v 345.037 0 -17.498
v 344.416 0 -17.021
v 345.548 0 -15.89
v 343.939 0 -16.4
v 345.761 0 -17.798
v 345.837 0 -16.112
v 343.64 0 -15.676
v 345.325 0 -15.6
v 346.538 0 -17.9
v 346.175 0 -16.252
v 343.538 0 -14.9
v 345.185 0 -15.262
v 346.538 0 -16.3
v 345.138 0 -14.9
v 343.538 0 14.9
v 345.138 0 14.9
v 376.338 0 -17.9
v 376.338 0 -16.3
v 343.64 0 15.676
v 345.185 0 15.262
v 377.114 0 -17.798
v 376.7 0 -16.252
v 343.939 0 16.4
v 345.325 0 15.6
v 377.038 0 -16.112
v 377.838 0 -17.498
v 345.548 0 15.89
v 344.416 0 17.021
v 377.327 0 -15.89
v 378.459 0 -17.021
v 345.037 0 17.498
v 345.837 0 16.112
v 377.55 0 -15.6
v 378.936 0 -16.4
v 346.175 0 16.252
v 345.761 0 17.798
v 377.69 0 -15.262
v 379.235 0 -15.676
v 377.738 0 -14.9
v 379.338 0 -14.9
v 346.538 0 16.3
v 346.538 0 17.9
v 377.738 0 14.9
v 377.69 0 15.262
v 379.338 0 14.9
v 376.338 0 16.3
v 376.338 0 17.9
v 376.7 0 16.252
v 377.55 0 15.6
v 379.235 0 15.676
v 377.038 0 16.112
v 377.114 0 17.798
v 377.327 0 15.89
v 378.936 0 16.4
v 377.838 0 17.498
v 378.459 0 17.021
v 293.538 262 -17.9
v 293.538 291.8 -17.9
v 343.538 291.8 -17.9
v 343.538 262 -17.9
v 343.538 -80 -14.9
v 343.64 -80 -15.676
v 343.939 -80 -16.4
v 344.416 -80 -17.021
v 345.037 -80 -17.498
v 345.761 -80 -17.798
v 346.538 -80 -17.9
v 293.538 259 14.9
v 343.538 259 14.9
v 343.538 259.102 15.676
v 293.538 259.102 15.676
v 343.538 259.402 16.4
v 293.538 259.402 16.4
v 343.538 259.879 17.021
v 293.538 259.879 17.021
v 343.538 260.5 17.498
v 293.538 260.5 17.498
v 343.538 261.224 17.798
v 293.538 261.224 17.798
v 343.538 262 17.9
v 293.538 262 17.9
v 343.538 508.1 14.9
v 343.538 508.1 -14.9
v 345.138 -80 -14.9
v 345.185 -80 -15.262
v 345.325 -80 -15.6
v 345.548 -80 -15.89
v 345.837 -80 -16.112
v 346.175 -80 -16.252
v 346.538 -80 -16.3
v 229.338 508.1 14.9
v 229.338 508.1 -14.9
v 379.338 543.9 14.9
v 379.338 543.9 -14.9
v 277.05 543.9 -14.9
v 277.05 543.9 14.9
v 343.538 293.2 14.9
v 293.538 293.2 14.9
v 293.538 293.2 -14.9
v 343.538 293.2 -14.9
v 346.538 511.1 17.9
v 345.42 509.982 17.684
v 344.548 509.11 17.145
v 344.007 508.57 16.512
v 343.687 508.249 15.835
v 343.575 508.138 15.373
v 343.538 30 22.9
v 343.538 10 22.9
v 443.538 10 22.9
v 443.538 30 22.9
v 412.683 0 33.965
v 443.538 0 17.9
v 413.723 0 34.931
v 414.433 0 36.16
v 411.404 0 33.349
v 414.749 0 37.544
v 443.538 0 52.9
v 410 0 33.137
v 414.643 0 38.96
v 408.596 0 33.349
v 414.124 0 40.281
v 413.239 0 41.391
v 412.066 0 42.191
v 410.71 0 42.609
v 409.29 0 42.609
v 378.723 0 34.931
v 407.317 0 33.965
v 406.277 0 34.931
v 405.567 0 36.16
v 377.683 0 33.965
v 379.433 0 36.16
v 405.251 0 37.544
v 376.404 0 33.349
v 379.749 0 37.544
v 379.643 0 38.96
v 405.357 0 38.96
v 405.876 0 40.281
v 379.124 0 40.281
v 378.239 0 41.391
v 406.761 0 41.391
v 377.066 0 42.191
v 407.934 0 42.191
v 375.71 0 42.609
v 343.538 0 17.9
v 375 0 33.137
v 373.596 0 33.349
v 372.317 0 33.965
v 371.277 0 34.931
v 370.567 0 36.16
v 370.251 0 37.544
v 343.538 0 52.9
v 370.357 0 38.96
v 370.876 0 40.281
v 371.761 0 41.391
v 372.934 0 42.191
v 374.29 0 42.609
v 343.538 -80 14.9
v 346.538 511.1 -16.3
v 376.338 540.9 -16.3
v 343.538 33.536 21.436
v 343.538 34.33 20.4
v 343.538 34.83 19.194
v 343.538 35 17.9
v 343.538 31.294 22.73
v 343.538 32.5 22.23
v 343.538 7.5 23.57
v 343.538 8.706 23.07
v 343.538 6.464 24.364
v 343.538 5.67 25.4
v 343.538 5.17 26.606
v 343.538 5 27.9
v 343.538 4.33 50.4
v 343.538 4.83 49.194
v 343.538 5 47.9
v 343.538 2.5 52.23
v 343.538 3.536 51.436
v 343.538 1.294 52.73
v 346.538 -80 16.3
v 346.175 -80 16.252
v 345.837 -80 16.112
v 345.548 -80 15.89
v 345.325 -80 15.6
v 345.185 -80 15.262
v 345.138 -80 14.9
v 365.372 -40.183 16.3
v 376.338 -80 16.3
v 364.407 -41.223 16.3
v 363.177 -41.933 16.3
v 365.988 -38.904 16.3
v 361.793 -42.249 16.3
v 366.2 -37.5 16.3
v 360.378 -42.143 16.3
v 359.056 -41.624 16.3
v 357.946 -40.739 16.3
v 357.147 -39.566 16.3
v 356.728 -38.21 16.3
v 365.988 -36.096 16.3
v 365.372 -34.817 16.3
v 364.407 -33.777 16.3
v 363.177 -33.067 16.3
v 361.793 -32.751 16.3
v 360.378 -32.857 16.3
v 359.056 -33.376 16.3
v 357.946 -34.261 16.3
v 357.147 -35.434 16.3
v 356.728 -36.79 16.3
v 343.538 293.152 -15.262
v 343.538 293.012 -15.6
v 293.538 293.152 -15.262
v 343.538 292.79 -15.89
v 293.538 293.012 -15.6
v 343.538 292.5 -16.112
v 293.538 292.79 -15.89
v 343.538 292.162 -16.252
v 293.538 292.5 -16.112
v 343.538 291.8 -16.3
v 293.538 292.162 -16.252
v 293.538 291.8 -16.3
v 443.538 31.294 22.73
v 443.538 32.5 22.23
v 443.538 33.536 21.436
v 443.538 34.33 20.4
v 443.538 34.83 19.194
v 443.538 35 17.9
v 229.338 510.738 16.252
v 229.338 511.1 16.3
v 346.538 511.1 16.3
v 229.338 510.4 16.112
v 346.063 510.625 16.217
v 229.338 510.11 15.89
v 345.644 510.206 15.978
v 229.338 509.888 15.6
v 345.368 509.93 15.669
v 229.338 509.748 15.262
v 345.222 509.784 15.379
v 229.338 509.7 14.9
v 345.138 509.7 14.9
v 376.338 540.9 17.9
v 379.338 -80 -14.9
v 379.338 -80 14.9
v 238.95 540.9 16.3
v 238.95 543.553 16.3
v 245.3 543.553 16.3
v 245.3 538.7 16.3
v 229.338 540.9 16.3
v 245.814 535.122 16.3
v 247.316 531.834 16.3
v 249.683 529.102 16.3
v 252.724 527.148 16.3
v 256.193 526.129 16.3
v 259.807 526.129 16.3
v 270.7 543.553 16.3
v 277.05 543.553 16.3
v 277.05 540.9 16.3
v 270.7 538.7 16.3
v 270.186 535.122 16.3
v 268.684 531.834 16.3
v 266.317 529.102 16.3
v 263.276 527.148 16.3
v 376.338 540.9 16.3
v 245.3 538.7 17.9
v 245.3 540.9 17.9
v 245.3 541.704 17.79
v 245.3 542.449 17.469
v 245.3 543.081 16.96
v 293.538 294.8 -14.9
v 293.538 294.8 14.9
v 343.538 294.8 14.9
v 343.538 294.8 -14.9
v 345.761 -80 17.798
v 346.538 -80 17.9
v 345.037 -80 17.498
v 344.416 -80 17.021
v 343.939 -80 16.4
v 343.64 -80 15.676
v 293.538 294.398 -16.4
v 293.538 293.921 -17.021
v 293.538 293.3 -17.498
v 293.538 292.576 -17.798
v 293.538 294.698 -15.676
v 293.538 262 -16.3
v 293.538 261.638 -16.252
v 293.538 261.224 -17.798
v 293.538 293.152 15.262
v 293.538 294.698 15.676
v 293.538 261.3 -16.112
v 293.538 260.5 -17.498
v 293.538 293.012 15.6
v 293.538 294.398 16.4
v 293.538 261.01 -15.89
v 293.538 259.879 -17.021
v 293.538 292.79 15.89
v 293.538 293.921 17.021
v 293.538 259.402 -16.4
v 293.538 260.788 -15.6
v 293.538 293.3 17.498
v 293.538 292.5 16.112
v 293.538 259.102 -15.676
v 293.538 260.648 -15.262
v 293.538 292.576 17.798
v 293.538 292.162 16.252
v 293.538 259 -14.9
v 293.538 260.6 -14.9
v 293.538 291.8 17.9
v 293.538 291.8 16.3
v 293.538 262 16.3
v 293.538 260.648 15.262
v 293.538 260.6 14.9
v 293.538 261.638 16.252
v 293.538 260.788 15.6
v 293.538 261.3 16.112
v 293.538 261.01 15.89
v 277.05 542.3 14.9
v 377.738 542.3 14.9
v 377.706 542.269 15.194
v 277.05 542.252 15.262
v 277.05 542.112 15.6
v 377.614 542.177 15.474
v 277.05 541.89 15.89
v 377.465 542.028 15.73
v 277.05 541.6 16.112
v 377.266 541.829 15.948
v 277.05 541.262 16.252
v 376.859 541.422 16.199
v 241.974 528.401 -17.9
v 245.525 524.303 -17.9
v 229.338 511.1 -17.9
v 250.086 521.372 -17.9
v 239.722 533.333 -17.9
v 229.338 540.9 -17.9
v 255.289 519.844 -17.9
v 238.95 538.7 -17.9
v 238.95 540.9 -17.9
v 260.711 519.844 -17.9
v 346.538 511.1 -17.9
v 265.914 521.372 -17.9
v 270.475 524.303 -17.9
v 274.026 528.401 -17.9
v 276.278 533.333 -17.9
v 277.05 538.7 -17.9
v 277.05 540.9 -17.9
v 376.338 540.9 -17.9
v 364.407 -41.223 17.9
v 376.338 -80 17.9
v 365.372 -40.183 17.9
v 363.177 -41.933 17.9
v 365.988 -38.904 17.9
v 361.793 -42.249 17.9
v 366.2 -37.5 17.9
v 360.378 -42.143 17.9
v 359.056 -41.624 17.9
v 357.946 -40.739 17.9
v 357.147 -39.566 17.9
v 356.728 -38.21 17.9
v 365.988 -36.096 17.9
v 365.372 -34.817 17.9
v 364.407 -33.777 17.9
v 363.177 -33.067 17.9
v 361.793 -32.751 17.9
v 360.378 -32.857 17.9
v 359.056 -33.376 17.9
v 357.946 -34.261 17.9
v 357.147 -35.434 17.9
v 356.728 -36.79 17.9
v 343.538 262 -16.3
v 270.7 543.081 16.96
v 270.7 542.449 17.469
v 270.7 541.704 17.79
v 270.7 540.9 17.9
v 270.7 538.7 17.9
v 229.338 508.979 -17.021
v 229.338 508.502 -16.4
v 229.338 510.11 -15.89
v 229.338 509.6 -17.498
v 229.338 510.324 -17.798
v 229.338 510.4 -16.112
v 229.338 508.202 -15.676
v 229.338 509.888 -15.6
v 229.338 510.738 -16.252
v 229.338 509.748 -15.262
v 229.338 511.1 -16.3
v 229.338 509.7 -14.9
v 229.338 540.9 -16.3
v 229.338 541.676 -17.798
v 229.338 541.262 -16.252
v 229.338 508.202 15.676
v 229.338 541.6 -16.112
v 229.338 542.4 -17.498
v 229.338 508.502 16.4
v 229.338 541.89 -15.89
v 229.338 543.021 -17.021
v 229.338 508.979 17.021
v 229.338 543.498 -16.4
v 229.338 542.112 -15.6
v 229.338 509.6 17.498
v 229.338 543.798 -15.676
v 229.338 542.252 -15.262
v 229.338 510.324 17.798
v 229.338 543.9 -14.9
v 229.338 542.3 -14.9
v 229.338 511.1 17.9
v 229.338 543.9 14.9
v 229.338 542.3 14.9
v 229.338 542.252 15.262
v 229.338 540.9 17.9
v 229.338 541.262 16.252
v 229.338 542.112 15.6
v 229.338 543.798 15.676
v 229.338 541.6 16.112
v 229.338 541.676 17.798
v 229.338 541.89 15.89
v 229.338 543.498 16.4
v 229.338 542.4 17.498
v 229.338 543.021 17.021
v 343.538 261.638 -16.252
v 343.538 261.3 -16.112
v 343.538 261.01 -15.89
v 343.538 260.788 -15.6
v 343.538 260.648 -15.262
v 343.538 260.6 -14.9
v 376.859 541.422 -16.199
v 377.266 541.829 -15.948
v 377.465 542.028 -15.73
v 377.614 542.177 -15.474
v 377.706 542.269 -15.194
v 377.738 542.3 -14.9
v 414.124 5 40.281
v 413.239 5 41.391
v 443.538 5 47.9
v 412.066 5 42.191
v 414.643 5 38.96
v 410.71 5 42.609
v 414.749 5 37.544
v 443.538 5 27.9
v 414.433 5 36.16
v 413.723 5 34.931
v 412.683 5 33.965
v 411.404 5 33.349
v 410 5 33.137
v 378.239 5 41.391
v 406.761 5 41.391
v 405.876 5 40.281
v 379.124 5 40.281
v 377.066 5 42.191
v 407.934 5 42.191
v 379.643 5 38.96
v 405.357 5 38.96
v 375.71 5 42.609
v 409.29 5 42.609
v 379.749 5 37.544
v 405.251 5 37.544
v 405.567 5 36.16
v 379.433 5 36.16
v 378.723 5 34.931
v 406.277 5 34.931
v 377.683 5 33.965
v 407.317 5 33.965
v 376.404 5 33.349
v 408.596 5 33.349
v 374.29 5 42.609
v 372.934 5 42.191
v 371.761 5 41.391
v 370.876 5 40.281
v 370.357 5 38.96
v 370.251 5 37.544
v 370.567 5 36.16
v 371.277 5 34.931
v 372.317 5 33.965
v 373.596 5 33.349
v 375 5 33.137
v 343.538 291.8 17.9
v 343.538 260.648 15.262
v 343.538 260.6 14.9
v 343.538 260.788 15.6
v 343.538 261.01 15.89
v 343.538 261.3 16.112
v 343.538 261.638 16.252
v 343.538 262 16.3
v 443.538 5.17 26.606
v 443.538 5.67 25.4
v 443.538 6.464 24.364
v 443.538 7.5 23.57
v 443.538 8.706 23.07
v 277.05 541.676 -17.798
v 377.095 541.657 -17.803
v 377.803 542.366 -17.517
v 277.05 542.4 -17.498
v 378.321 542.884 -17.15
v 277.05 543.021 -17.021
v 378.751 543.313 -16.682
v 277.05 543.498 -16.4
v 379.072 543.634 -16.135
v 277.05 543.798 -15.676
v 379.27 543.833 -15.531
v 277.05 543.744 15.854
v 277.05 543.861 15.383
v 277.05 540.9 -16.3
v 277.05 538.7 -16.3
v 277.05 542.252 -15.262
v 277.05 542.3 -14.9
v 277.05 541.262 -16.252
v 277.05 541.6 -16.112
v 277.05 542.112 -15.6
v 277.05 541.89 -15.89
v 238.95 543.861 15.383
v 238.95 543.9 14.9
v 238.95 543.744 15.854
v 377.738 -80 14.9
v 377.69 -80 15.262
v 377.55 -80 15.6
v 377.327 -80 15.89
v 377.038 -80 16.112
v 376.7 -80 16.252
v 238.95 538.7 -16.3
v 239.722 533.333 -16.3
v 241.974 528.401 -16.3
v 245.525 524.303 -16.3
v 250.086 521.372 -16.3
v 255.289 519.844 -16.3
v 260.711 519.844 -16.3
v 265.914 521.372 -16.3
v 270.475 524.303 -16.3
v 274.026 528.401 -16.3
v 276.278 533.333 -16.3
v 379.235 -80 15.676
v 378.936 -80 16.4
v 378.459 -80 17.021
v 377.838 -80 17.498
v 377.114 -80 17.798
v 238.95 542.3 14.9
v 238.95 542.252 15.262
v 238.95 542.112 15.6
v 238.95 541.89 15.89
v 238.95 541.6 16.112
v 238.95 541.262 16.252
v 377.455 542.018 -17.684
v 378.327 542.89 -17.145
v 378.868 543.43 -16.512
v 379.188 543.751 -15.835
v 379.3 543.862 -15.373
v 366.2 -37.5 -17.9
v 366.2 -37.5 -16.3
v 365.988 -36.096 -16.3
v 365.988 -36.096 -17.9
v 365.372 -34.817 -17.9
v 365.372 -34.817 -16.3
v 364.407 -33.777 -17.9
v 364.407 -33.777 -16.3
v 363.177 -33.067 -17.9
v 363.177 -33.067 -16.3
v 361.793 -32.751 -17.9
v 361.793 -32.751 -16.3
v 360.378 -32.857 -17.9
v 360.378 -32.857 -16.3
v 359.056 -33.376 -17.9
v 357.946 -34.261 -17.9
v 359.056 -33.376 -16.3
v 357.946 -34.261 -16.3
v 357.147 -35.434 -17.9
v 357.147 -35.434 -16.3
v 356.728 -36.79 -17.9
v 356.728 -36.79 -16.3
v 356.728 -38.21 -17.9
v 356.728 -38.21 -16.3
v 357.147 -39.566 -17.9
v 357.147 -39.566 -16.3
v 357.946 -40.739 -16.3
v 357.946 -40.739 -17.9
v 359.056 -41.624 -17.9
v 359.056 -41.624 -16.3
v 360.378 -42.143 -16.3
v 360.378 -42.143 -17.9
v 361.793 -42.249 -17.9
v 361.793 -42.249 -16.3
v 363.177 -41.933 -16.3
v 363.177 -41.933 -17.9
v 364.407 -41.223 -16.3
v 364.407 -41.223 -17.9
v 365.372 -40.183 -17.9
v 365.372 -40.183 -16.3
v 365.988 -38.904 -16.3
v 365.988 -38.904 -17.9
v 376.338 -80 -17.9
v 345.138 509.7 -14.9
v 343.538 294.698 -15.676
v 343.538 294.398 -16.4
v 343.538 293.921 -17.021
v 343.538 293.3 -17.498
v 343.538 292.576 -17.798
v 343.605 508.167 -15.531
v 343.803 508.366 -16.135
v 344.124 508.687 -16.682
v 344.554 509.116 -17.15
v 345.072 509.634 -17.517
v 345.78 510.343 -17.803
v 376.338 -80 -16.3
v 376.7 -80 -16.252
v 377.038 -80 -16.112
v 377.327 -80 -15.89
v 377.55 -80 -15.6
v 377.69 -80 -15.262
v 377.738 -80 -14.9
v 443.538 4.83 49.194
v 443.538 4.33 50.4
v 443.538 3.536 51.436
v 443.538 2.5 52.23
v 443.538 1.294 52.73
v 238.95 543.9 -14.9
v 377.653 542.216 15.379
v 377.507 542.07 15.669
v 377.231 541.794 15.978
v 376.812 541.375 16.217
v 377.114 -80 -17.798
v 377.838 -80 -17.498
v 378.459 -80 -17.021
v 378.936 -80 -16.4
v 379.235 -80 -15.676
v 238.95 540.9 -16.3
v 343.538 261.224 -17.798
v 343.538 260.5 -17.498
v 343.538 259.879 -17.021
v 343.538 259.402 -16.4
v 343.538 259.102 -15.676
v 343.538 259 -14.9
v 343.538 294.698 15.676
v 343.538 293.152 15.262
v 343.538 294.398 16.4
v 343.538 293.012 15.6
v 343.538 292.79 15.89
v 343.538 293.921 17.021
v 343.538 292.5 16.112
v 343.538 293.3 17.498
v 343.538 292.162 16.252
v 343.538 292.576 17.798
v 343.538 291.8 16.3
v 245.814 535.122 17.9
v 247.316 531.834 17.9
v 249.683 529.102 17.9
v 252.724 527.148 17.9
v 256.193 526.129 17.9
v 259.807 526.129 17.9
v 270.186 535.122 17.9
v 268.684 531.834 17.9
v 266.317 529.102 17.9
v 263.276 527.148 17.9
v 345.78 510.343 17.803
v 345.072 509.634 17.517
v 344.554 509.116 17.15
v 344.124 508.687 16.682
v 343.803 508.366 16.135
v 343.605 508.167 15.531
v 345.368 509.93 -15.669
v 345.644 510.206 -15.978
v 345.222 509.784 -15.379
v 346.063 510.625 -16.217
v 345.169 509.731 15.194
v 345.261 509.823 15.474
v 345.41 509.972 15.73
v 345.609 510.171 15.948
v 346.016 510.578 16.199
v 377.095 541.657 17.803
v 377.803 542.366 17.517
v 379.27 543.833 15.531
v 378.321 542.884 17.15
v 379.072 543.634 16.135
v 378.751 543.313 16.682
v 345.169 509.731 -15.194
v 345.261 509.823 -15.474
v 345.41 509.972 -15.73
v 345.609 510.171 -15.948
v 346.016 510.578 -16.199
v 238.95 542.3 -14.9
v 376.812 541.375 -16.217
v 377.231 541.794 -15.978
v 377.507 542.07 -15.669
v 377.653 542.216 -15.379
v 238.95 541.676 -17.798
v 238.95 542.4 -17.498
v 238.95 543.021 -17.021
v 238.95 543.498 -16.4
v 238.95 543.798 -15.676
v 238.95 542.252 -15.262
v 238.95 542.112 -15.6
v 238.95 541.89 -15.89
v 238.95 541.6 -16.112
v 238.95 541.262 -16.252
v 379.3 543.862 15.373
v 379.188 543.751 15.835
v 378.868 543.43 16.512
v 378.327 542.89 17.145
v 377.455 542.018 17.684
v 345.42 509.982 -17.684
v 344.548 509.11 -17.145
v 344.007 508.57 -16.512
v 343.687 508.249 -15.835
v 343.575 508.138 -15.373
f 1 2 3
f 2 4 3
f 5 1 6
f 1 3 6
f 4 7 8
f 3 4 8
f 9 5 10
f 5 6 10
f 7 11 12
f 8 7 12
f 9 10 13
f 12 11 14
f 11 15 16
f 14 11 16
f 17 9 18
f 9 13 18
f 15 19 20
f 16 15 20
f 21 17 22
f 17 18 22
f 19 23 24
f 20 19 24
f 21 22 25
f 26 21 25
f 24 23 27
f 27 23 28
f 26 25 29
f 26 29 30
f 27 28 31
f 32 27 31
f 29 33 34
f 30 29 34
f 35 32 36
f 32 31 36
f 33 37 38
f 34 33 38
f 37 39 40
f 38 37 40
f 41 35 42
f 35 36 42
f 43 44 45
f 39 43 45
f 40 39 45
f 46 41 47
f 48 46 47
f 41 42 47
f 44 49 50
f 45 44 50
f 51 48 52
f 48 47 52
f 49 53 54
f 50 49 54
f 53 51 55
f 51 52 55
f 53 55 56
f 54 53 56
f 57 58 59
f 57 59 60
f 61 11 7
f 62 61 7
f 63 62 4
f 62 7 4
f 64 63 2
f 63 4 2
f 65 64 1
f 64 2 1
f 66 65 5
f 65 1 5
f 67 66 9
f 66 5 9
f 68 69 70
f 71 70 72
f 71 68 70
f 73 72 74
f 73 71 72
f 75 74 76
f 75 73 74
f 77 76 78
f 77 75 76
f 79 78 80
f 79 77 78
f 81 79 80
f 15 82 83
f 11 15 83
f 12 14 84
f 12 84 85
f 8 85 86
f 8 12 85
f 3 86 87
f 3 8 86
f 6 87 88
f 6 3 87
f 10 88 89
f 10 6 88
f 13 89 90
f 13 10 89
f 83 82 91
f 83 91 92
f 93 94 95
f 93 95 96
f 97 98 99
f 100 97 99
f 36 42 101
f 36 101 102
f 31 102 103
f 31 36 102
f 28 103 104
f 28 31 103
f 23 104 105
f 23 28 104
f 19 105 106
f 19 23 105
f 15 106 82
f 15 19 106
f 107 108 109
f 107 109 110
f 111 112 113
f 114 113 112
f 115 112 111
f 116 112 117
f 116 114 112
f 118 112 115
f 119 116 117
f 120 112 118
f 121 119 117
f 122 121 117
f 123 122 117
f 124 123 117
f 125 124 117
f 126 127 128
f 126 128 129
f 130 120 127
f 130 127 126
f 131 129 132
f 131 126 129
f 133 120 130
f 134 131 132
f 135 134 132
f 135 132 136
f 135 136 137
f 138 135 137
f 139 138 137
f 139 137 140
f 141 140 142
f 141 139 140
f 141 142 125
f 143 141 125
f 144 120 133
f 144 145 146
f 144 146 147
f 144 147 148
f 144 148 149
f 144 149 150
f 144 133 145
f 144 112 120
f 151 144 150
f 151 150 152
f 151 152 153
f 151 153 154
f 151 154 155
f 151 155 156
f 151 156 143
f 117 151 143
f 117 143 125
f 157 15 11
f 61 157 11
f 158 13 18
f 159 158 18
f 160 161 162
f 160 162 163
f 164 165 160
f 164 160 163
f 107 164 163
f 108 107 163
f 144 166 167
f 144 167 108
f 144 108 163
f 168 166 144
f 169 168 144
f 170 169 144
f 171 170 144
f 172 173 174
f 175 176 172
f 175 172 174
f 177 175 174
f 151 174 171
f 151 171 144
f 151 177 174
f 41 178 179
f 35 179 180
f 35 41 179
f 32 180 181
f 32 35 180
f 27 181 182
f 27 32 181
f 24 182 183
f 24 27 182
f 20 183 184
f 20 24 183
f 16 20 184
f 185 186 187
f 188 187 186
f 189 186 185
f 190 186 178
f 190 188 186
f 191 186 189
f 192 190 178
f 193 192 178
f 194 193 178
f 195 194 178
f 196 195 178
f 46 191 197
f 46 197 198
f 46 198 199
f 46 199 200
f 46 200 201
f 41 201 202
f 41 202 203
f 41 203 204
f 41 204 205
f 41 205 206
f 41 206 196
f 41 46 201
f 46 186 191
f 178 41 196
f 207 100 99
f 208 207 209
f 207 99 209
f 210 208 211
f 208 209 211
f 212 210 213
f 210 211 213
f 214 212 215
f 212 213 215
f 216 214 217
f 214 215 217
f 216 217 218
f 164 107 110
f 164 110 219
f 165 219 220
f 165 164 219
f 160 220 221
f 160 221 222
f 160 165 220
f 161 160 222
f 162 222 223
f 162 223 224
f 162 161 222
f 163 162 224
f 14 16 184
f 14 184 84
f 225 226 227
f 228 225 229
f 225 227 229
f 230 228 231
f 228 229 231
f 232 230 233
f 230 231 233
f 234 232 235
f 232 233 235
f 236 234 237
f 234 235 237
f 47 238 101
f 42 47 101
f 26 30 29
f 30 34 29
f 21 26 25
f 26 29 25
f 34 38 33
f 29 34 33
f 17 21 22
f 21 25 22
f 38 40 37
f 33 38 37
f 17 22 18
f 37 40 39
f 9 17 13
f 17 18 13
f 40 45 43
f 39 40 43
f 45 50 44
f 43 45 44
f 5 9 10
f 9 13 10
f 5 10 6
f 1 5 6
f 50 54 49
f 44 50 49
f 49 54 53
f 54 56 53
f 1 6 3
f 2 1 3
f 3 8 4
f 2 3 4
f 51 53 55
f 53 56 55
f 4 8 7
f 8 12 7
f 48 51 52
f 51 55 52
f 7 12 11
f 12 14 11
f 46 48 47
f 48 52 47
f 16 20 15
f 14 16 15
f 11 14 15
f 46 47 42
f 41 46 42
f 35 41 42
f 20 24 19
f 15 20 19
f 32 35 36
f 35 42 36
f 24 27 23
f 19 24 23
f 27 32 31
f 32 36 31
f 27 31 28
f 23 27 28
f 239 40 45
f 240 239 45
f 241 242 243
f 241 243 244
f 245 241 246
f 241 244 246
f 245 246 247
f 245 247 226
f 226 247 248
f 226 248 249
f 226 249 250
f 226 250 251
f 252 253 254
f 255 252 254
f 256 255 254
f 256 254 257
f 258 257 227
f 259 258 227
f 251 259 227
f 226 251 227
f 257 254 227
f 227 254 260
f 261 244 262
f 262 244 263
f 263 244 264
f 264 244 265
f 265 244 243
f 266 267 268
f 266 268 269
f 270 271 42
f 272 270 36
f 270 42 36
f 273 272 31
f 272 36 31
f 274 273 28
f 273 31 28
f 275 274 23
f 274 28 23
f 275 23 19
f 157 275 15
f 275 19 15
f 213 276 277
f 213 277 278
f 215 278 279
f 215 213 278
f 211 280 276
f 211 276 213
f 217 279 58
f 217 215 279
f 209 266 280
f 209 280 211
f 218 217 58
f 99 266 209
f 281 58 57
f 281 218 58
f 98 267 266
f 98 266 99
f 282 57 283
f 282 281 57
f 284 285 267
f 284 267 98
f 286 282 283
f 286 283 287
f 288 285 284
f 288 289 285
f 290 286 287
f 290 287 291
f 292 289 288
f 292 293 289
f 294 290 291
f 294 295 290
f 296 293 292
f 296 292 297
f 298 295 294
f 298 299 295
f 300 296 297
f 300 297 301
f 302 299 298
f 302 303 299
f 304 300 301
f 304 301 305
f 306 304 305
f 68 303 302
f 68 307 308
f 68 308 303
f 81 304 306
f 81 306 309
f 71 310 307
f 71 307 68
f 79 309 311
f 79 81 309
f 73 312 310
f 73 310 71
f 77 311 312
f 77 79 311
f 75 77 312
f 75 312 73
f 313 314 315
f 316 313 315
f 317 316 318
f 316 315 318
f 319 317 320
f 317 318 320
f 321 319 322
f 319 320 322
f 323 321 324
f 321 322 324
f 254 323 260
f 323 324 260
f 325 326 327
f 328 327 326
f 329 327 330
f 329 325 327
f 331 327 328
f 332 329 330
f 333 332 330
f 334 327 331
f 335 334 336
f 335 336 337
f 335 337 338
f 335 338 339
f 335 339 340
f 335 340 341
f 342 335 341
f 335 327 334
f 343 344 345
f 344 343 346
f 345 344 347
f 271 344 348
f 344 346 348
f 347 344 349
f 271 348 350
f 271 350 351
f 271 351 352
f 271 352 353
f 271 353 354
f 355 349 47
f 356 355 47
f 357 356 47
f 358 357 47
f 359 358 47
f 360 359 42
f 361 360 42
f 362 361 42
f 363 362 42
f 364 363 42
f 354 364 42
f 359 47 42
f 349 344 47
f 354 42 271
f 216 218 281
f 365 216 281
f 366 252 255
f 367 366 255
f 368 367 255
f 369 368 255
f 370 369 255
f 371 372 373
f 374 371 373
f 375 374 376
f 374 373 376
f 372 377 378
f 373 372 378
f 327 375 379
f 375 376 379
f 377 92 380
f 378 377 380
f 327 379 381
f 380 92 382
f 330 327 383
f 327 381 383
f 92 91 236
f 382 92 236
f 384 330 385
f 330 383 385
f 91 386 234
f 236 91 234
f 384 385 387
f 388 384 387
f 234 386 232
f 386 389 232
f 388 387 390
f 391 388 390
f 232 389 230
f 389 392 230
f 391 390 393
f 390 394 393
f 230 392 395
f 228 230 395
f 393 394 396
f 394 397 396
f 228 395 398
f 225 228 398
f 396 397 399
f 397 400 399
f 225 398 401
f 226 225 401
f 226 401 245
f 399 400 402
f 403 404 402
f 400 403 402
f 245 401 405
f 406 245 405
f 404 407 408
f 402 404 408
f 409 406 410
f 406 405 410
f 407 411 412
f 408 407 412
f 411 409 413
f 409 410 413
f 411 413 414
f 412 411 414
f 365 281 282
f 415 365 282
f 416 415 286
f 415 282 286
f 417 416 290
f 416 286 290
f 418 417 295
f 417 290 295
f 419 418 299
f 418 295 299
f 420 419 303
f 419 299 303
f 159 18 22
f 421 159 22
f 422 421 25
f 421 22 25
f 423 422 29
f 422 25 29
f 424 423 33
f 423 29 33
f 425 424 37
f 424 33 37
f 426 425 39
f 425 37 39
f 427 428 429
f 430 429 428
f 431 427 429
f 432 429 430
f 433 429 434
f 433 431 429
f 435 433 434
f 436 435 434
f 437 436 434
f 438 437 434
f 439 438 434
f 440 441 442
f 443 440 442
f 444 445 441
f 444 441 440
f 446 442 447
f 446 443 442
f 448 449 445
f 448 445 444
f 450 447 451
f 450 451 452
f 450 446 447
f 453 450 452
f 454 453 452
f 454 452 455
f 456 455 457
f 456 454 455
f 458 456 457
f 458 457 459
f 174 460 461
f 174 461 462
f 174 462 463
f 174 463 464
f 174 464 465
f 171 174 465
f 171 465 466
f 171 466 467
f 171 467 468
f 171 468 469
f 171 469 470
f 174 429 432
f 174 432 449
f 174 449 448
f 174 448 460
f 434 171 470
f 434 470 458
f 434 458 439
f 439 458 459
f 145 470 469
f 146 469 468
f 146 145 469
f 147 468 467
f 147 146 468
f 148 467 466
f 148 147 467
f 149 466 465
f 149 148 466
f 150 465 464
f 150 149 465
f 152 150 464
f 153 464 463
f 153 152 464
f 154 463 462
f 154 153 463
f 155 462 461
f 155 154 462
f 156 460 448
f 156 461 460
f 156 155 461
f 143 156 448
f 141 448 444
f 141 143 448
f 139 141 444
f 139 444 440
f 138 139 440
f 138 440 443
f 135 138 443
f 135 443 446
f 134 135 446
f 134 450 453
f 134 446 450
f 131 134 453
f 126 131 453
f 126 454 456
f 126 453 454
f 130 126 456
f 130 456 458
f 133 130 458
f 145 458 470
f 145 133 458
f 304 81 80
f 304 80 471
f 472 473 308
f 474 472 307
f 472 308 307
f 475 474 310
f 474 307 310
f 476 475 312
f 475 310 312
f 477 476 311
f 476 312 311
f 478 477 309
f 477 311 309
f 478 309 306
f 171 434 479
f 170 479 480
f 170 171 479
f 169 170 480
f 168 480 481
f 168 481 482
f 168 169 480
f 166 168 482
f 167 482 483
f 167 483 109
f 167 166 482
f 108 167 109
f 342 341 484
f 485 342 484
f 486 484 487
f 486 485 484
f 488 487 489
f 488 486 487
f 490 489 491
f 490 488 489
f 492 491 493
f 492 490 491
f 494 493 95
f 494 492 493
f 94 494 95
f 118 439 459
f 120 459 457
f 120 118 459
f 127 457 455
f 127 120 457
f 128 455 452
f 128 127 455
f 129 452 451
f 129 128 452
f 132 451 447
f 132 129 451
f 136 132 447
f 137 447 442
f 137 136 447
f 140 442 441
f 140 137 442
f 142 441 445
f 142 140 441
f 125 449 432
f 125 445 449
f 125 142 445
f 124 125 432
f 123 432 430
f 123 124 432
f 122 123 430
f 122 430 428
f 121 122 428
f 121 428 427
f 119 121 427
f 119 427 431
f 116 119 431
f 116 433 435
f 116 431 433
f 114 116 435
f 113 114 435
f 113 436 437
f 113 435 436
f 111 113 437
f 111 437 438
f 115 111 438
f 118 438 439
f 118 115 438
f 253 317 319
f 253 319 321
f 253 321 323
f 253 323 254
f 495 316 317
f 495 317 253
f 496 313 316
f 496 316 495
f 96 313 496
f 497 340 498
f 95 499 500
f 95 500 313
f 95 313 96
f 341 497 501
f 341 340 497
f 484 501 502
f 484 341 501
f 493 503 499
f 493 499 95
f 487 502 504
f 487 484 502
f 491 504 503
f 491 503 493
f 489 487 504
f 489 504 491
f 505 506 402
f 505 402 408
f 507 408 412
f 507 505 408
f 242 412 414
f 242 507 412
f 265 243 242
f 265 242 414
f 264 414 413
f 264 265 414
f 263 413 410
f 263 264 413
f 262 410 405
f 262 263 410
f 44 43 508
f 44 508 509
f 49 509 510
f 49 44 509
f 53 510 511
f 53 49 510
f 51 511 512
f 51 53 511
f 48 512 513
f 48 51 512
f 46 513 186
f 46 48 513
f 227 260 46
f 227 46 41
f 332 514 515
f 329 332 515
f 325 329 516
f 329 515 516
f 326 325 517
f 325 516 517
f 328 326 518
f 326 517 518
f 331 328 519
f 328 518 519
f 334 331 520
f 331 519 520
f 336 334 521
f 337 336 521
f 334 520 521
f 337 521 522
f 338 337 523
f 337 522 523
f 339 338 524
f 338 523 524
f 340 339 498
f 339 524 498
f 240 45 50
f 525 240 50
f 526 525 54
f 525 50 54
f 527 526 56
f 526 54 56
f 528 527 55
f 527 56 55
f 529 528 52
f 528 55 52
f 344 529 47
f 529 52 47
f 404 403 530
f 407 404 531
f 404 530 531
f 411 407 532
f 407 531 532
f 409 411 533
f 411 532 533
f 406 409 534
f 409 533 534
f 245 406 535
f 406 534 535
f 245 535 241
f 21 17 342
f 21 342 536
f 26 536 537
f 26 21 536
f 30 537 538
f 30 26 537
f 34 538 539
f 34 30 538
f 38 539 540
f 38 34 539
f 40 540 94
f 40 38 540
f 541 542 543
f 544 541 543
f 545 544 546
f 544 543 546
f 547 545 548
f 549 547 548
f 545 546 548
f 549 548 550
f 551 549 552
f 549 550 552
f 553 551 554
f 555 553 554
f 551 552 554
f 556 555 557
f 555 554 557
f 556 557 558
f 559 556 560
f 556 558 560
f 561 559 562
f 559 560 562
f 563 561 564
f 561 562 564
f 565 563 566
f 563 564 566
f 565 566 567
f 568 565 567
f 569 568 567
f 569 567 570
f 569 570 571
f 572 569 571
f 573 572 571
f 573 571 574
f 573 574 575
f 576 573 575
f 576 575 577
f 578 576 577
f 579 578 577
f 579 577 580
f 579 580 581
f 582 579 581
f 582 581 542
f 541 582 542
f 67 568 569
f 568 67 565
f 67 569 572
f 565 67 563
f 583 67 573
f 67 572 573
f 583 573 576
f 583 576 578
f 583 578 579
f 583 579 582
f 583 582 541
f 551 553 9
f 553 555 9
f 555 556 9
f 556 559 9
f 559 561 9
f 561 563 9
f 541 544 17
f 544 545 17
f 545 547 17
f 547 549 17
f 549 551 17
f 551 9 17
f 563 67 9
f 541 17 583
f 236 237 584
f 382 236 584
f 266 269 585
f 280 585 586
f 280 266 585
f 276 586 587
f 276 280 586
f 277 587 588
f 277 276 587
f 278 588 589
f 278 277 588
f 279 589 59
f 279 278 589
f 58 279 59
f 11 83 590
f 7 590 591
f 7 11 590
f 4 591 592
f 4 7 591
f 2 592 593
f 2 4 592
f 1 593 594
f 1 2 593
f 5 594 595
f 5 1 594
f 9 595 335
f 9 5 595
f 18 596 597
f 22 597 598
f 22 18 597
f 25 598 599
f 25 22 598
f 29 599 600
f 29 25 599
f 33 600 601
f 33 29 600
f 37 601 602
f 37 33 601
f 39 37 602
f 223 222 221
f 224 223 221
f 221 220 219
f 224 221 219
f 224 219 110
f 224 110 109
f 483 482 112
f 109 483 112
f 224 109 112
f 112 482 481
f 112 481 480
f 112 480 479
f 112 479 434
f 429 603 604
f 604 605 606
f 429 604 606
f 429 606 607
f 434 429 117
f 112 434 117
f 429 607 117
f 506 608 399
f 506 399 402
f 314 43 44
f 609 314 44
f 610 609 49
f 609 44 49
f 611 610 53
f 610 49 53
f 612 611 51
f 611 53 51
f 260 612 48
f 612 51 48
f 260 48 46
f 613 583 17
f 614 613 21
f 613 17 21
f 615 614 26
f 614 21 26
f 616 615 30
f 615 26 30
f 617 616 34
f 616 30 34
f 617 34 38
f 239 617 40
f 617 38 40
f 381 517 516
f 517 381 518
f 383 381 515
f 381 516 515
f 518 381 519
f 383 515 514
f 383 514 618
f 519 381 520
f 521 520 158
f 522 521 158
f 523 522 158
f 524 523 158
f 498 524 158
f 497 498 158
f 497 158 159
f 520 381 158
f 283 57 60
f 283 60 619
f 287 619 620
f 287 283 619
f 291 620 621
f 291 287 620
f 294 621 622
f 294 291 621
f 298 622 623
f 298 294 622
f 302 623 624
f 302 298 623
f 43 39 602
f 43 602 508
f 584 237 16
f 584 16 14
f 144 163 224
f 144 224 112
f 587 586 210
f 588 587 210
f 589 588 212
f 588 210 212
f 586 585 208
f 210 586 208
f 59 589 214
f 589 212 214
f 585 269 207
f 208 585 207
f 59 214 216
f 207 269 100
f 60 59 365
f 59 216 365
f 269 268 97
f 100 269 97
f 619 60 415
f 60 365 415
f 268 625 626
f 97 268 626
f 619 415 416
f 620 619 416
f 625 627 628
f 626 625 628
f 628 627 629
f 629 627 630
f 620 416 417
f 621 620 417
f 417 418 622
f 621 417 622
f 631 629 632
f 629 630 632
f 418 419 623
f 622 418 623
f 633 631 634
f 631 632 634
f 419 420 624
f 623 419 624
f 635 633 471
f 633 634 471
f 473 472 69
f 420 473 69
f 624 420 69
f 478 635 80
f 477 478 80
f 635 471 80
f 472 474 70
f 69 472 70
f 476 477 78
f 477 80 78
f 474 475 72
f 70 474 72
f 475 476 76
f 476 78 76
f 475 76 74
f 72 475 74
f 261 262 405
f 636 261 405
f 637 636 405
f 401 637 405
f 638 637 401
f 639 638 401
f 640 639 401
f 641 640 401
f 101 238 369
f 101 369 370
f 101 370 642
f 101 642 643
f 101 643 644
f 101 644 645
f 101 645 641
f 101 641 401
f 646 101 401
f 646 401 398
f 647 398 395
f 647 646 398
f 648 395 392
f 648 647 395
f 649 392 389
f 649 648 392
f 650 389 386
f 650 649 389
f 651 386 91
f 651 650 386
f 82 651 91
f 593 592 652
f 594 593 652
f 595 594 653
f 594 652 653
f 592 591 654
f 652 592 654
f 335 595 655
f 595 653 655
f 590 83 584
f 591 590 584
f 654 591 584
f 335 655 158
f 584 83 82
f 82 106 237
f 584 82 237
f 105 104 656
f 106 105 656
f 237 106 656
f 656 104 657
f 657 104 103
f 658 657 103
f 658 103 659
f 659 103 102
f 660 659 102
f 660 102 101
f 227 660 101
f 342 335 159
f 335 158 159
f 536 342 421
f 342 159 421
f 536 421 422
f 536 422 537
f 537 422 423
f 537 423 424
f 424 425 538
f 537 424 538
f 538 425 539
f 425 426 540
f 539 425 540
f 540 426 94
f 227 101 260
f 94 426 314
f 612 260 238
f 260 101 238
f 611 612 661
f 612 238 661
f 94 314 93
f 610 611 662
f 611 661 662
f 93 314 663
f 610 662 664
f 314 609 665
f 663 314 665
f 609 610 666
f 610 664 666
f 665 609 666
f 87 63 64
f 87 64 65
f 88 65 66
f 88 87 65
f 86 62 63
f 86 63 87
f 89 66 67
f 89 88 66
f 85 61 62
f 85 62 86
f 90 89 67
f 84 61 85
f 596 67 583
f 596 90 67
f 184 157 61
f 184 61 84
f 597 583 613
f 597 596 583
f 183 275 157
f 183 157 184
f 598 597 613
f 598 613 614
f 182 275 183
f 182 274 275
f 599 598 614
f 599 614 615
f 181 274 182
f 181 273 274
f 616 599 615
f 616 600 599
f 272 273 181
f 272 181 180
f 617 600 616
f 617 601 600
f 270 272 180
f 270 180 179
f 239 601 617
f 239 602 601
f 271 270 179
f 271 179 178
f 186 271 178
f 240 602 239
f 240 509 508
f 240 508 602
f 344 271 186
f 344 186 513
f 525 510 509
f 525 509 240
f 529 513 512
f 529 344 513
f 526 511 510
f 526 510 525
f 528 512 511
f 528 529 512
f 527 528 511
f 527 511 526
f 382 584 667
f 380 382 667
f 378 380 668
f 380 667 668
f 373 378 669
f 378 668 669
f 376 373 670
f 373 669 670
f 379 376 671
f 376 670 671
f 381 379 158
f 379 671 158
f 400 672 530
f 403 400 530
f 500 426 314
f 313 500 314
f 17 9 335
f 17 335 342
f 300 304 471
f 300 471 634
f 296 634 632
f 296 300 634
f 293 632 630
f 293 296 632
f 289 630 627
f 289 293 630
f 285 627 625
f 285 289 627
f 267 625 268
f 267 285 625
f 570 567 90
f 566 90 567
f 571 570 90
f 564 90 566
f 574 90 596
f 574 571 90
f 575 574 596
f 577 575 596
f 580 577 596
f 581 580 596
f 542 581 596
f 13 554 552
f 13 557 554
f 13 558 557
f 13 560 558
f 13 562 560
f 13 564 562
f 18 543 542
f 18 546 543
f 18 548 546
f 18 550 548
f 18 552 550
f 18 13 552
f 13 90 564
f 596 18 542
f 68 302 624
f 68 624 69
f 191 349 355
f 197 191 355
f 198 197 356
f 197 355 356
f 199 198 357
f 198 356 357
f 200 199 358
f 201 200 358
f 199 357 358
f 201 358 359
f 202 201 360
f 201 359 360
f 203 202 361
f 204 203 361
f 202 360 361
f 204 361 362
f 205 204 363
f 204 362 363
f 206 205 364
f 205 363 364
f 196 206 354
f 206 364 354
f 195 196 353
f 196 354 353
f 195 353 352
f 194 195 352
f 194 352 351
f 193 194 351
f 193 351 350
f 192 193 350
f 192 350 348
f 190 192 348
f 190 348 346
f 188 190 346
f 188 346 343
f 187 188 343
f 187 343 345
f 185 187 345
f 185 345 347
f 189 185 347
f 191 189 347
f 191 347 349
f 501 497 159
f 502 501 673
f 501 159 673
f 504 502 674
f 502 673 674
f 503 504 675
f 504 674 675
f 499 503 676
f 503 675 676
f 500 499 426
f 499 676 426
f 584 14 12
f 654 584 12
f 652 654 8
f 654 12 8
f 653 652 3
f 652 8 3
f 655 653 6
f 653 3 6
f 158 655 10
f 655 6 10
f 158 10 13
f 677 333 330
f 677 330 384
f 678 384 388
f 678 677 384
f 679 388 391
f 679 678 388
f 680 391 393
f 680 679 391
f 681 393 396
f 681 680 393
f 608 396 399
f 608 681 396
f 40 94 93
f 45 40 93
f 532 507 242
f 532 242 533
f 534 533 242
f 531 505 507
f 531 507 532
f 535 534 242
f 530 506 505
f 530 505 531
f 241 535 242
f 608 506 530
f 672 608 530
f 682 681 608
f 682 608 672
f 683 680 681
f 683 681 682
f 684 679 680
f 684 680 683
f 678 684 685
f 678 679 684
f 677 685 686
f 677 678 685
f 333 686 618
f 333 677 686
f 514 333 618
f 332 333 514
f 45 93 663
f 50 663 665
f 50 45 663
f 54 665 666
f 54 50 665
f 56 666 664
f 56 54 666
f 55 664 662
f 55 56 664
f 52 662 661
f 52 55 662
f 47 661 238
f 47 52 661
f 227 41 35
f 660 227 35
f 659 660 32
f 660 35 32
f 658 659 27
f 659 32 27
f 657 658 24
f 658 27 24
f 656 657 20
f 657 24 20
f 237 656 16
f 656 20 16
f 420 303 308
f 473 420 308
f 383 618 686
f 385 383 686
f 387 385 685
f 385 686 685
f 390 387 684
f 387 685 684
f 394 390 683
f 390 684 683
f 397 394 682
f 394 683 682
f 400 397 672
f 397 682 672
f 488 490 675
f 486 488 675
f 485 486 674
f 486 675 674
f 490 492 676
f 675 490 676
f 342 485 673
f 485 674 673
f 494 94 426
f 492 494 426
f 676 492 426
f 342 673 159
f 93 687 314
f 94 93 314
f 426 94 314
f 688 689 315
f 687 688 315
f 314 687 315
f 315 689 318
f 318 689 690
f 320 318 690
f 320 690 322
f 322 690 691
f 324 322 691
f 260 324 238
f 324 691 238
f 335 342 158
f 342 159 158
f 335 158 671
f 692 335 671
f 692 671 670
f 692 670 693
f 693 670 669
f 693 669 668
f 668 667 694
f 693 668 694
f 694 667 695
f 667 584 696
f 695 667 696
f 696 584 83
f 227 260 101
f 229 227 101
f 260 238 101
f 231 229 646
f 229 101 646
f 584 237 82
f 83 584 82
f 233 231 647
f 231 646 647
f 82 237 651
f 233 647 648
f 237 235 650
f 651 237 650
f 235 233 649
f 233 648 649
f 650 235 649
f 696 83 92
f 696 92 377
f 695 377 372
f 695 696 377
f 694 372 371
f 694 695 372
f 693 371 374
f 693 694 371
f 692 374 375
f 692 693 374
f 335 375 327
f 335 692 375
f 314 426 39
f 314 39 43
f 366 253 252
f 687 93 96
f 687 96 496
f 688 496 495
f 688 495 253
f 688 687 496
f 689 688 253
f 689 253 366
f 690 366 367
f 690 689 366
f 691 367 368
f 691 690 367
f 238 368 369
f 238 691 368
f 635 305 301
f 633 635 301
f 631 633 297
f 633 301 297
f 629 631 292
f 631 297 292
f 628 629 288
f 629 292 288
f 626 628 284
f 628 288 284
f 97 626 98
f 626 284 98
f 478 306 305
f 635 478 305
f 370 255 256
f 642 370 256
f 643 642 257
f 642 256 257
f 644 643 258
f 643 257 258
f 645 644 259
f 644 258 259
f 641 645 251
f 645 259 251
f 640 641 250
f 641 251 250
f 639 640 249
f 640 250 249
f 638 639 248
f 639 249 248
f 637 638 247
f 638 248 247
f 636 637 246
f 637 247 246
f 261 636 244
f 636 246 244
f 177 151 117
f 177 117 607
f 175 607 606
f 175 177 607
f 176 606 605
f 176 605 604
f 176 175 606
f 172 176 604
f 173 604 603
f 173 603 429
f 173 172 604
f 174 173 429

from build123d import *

# Parameters (mm, degrees)
STRUCTURAL_MEMBERMAIN_DEPTH                   = 1
STRUCTURAL_MEMBERMAIN_DEPTH_BACK              = 80
STRUCTURAL_MEMBERMAIN_2_DEPTH                 = 553.314422766
STRUCTURAL_MEMBERMAIN_3_DEPTH                 = 158.414422766
STRUCTURAL_MEMBERMAIN_4_DEPTH                 = 68.9
CUT_EXTRUDETOPRAILGUIDE_DEPTH                 = 664.35854476
CUT_EXTRUDETOPRAILGUIDE_DEPTH_BACK            = 664.35854476
STRUCTURAL_MEMBERANGLE_DEPTH                  = 100
SKETCH15_R                                    = 4.7625
CUT_EXTRUDEMOUNTINGHOLES_DEPTH                = 704.811859737
CUT_EXTRUDEENLARGERAILGUIDE_DEPTH             = 704.811859737
CUT_EXTRUDEENLARGERAILGUIDE_DIRECTION_2_REACH = 705.812
SKETCH19_R                                    = 4.7625
CUT_EXTRUDE1_DEPTH                            = 703.733494225


with BuildPart() as part:
    # Sketch11 → Structural MemberMain (new, two sides)
    with BuildSketch(Plane(origin=(361.4375, 0, 0), x_dir=(-1, 0, 0), z_dir=(0, 1, 0))) as structural_membermain_sk:
        with BuildLine():
            Line((-14.9, 17.9), (14.9, 17.9))
            ThreePointArc((14.9, 17.9), (17.021320344, 17.021320344), (17.9, 14.9))
            Line((17.9, 14.9), (17.9, -14.9))
            ThreePointArc((17.9, -14.9), (17.021320344, -17.021320344), (14.9, -17.9))
            Line((14.9, -17.9), (-14.9, -17.9))
            ThreePointArc((-14.9, -17.9), (-17.021320344, -17.021320344), (-17.9, -14.9))
            Line((-17.9, -14.9), (-17.9, 14.9))
            ThreePointArc((-17.9, 14.9), (-17.021320344, 17.021320344), (-14.9, 17.9))
        make_face()
        with BuildLine():
            Line((-14.9, 16.3), (14.9, 16.3))
            ThreePointArc((14.9, 16.3), (15.889949494, 15.889949494), (16.3, 14.9))
            Line((16.3, 14.9), (16.3, -14.9))
            ThreePointArc((16.3, -14.9), (15.889949494, -15.889949494), (14.9, -16.3))
            Line((14.9, -16.3), (-14.9, -16.3))
            ThreePointArc((-14.9, -16.3), (-15.889949494, -15.889949494), (-16.3, -14.9))
            Line((-16.3, -14.9), (-16.3, 14.9))
            ThreePointArc((-16.3, 14.9), (-15.889949494, 15.889949494), (-14.9, 16.3))
        make_face(mode=Mode.SUBTRACT)
    extrude(amount=STRUCTURAL_MEMBERMAIN_DEPTH)
    extrude(structural_membermain_sk.sketch, amount=-STRUCTURAL_MEMBERMAIN_DEPTH_BACK)

    # Structural MemberMain mitre 1
    split(bisect_by=Plane(origin=(361.4375, 0, 0), x_dir=(1, 0, 0), z_dir=(0, -1, 0)), keep=Keep.TOP)

    # Sketch19 → Cut-Extrude1 (cut, through all)
    with BuildSketch(Plane.XY.offset(17.9)):
        with Locations((361.4375, -37.5)):
            Circle(SKETCH19_R)
    extrude(amount=-CUT_EXTRUDE1_DEPTH, mode=Mode.SUBTRACT)


with BuildPart() as body_2:
    # Sketch11 on segment 2 (carried to segment 2) → Structural MemberMain 2 (new body)
    with BuildSketch(Plane(origin=(361.4375, -1, 0), x_dir=(-1, 0, 0), z_dir=(0, 1, 0))):
        with BuildLine():
            Line((-14.9, 17.9), (14.9, 17.9))
            ThreePointArc((14.9, 17.9), (17.021320344, 17.021320344), (17.9, 14.9))
            Line((17.9, 14.9), (17.9, -14.9))
            ThreePointArc((17.9, -14.9), (17.021320344, -17.021320344), (14.9, -17.9))
            Line((14.9, -17.9), (-14.9, -17.9))
            ThreePointArc((-14.9, -17.9), (-17.021320344, -17.021320344), (-17.9, -14.9))
            Line((-17.9, -14.9), (-17.9, 14.9))
            ThreePointArc((-17.9, 14.9), (-17.021320344, 17.021320344), (-14.9, 17.9))
        make_face()
        with BuildLine():
            Line((-14.9, 16.3), (14.9, 16.3))
            ThreePointArc((14.9, 16.3), (15.889949494, 15.889949494), (16.3, 14.9))
            Line((16.3, 14.9), (16.3, -14.9))
            ThreePointArc((16.3, -14.9), (15.889949494, -15.889949494), (14.9, -16.3))
            Line((14.9, -16.3), (-14.9, -16.3))
            ThreePointArc((-14.9, -16.3), (-15.889949494, -15.889949494), (-16.3, -14.9))
            Line((-16.3, -14.9), (-16.3, 14.9))
            ThreePointArc((-16.3, 14.9), (-15.889949494, 15.889949494), (-14.9, 16.3))
        make_face(mode=Mode.SUBTRACT)
    extrude(amount=STRUCTURAL_MEMBERMAIN_2_DEPTH)

    # Structural MemberMain 2 mitre 1
    split(bisect_by=Plane(origin=(361.4375, 0, 0), x_dir=(-1, 0, 0), z_dir=(0, 1, 0)), keep=Keep.TOP)

    # Structural MemberMain 2 mitre 2
    split(bisect_by=Plane(origin=(361.4375, 526, 0), x_dir=(0.707106781, 0.707106781, 0), z_dir=(0.707106781, -0.707106781, 0)), keep=Keep.TOP)


with BuildPart() as body_3:
    # Sketch11 on segment 3 (carried to segment 3) → Structural MemberMain 3 (new body)
    with BuildSketch(Plane(origin=(387.751922766, 526, 0), x_dir=(0, -1, 0), z_dir=(-1, 0, 0))):
        with BuildLine():
            Line((-14.9, 17.9), (14.9, 17.9))
            ThreePointArc((14.9, 17.9), (17.021320344, 17.021320344), (17.9, 14.9))
            Line((17.9, 14.9), (17.9, -14.9))
            ThreePointArc((17.9, -14.9), (17.021320344, -17.021320344), (14.9, -17.9))
            Line((14.9, -17.9), (-14.9, -17.9))
            ThreePointArc((-14.9, -17.9), (-17.021320344, -17.021320344), (-17.9, -14.9))
            Line((-17.9, -14.9), (-17.9, 14.9))
            ThreePointArc((-17.9, 14.9), (-17.021320344, 17.021320344), (-14.9, 17.9))
        make_face()
        with BuildLine():
            Line((-14.9, 16.3), (14.9, 16.3))
            ThreePointArc((14.9, 16.3), (15.889949494, 15.889949494), (16.3, 14.9))
            Line((16.3, 14.9), (16.3, -14.9))
            ThreePointArc((16.3, -14.9), (15.889949494, -15.889949494), (14.9, -16.3))
            Line((14.9, -16.3), (-14.9, -16.3))
            ThreePointArc((-14.9, -16.3), (-15.889949494, -15.889949494), (-16.3, -14.9))
            Line((-16.3, -14.9), (-16.3, 14.9))
            ThreePointArc((-16.3, 14.9), (-15.889949494, 15.889949494), (-14.9, 16.3))
        make_face(mode=Mode.SUBTRACT)
    extrude(amount=STRUCTURAL_MEMBERMAIN_3_DEPTH)

    # Structural MemberMain 3 mitre 1
    split(bisect_by=Plane(origin=(361.4375, 526, 0), x_dir=(-0.707106781, -0.707106781, 0), z_dir=(-0.707106781, 0.707106781, 0)), keep=Keep.TOP)

    # Sketch12 → Cut-ExtrudeTopRailGuide (cut, two sides)
    with BuildSketch(Plane.XY) as cut_extrudetoprailguide_sk:
        with BuildLine():
            Line((245.3, 538.7), (245.3, 549.1))
            ThreePointArc((245.3, 549.1), (258, 561.8), (270.7, 549.1))
            Line((270.7, 549.1), (270.7, 538.7))
            ThreePointArc((270.7, 538.7), (258, 526), (245.3, 538.7))
        make_face()
    extrude(amount=CUT_EXTRUDETOPRAILGUIDE_DEPTH, mode=Mode.SUBTRACT)
    extrude(cut_extrudetoprailguide_sk.sketch, amount=-CUT_EXTRUDETOPRAILGUIDE_DEPTH_BACK, mode=Mode.SUBTRACT)

    # Sketch16 → Cut-ExtrudeEnlargeRailGuide (cut)
    with BuildSketch(Plane.XY):
        with BuildLine():
            Line((277.05, 538.7), (277.05, 549.1))
            ThreePointArc((277.05, 549.1), (258, 568.15), (238.95, 549.1))
            Line((238.95, 549.1), (238.95, 538.7))
            ThreePointArc((238.95, 538.7), (258, 519.65), (277.05, 538.7))
        make_face()
    extrude(amount=-CUT_EXTRUDEENLARGERAILGUIDE_DEPTH, mode=Mode.SUBTRACT)

    # Cut-ExtrudeEnlargeRailGuide direction 2: up to this face of the body (flat: up to its plane)
    cut_extrudeenlargerailguide_direction_2_end = Plane(body_3.part.faces().sort_by_distance((298.87879231, 525.884806009, 16.3))[0])
    # Sketch16 → Cut-ExtrudeEnlargeRailGuide direction 2 (cut, up to the picked face)
    with BuildSketch(Plane.XY, mode=Mode.PRIVATE) as cut_extrudeenlargerailguide_direction_2_sk1:
        with BuildLine():
            Line((277.05, 538.7), (277.05, 549.1))
            ThreePointArc((277.05, 549.1), (258, 568.15), (238.95, 549.1))
            Line((238.95, 549.1), (238.95, 538.7))
            ThreePointArc((238.95, 538.7), (258, 519.65), (277.05, 538.7))
        make_face()
    cut_extrudeenlargerailguide_direction_2_tool1 = split(extrude(cut_extrudeenlargerailguide_direction_2_sk1.sketch, amount=CUT_EXTRUDEENLARGERAILGUIDE_DIRECTION_2_REACH, mode=Mode.PRIVATE), bisect_by=cut_extrudeenlargerailguide_direction_2_end, keep=Keep.BOTH, mode=Mode.PRIVATE)
    add(cut_extrudeenlargerailguide_direction_2_tool1.solids().sort_by(Axis((258, 543.9, 0), (0, 0, 1)))[0], mode=Mode.SUBTRACT)


with BuildPart() as body_4:
    # Sketch11 on segment 4 (carried to segment 4) → Structural MemberMain 4 (new body)
    with BuildSketch(Plane(origin=(293.5375, 276.9, 0), x_dir=(0, 1, 0), z_dir=(1, 0, 0))):
        with BuildLine():
            Line((-14.9, 17.9), (14.9, 17.9))
            ThreePointArc((14.9, 17.9), (17.021320344, 17.021320344), (17.9, 14.9))
            Line((17.9, 14.9), (17.9, -14.9))
            ThreePointArc((17.9, -14.9), (17.021320344, -17.021320344), (14.9, -17.9))
            Line((14.9, -17.9), (-14.9, -17.9))
            ThreePointArc((-14.9, -17.9), (-17.021320344, -17.021320344), (-17.9, -14.9))
            Line((-17.9, -14.9), (-17.9, 14.9))
            ThreePointArc((-17.9, 14.9), (-17.021320344, 17.021320344), (-14.9, 17.9))
        make_face()
        with BuildLine():
            Line((-14.9, 16.3), (14.9, 16.3))
            ThreePointArc((14.9, 16.3), (15.889949494, 15.889949494), (16.3, 14.9))
            Line((16.3, 14.9), (16.3, -14.9))
            ThreePointArc((16.3, -14.9), (15.889949494, -15.889949494), (14.9, -16.3))
            Line((14.9, -16.3), (-14.9, -16.3))
            ThreePointArc((-14.9, -16.3), (-15.889949494, -15.889949494), (-16.3, -14.9))
            Line((-16.3, -14.9), (-16.3, 14.9))
            ThreePointArc((-16.3, 14.9), (-15.889949494, 15.889949494), (-14.9, 16.3))
        make_face(mode=Mode.SUBTRACT)
    extrude(amount=STRUCTURAL_MEMBERMAIN_4_DEPTH)

    # Structural MemberMain 4 mitre 1
    split(bisect_by=Plane(origin=(343.5375, 276.9, 0), x_dir=(0, -1, 0), z_dir=(-1, 0, 0)), keep=Keep.TOP)


with BuildPart() as body_5:
    # Sketch14 → Structural MemberAngle (new body)
    with BuildSketch(Plane(origin=(343.5375, 0, 17.9), x_dir=(0, 1, 0), z_dir=(1, 0, 0))):
        with BuildLine():
            Line((0, 0), (0, 35))
            ThreePointArc((0, 35), (3.535533906, 33.535533906), (5, 30))
            Line((5, 30), (5, 10))
            ThreePointArc((5, 10), (6.464466094, 6.464466094), (10, 5))
            Line((10, 5), (30, 5))
            ThreePointArc((30, 5), (33.535533906, 3.535533906), (35, 0))
            Line((35, 0), (0, 0))
        make_face()
    extrude(amount=STRUCTURAL_MEMBERANGLE_DEPTH)

    # Sketch15 → Cut-ExtrudeMountingHoles (cut, through all)
    with BuildSketch(Plane(origin=(0, 0, 0), x_dir=(1, 0, 0), z_dir=(0, 1, 0))):
        with Locations(Location((375, -37.9, 0), (0, 0, 90))):
            Circle(SKETCH15_R)
        with Locations(Location((410, -37.9, 0), (0, 0, 90))):
            Circle(SKETCH15_R)
    extrude(amount=CUT_EXTRUDEMOUNTINGHOLES_DEPTH, mode=Mode.SUBTRACT)


solid = Compound([part.part, body_2.part, body_3.part, body_4.part, body_5.part])
